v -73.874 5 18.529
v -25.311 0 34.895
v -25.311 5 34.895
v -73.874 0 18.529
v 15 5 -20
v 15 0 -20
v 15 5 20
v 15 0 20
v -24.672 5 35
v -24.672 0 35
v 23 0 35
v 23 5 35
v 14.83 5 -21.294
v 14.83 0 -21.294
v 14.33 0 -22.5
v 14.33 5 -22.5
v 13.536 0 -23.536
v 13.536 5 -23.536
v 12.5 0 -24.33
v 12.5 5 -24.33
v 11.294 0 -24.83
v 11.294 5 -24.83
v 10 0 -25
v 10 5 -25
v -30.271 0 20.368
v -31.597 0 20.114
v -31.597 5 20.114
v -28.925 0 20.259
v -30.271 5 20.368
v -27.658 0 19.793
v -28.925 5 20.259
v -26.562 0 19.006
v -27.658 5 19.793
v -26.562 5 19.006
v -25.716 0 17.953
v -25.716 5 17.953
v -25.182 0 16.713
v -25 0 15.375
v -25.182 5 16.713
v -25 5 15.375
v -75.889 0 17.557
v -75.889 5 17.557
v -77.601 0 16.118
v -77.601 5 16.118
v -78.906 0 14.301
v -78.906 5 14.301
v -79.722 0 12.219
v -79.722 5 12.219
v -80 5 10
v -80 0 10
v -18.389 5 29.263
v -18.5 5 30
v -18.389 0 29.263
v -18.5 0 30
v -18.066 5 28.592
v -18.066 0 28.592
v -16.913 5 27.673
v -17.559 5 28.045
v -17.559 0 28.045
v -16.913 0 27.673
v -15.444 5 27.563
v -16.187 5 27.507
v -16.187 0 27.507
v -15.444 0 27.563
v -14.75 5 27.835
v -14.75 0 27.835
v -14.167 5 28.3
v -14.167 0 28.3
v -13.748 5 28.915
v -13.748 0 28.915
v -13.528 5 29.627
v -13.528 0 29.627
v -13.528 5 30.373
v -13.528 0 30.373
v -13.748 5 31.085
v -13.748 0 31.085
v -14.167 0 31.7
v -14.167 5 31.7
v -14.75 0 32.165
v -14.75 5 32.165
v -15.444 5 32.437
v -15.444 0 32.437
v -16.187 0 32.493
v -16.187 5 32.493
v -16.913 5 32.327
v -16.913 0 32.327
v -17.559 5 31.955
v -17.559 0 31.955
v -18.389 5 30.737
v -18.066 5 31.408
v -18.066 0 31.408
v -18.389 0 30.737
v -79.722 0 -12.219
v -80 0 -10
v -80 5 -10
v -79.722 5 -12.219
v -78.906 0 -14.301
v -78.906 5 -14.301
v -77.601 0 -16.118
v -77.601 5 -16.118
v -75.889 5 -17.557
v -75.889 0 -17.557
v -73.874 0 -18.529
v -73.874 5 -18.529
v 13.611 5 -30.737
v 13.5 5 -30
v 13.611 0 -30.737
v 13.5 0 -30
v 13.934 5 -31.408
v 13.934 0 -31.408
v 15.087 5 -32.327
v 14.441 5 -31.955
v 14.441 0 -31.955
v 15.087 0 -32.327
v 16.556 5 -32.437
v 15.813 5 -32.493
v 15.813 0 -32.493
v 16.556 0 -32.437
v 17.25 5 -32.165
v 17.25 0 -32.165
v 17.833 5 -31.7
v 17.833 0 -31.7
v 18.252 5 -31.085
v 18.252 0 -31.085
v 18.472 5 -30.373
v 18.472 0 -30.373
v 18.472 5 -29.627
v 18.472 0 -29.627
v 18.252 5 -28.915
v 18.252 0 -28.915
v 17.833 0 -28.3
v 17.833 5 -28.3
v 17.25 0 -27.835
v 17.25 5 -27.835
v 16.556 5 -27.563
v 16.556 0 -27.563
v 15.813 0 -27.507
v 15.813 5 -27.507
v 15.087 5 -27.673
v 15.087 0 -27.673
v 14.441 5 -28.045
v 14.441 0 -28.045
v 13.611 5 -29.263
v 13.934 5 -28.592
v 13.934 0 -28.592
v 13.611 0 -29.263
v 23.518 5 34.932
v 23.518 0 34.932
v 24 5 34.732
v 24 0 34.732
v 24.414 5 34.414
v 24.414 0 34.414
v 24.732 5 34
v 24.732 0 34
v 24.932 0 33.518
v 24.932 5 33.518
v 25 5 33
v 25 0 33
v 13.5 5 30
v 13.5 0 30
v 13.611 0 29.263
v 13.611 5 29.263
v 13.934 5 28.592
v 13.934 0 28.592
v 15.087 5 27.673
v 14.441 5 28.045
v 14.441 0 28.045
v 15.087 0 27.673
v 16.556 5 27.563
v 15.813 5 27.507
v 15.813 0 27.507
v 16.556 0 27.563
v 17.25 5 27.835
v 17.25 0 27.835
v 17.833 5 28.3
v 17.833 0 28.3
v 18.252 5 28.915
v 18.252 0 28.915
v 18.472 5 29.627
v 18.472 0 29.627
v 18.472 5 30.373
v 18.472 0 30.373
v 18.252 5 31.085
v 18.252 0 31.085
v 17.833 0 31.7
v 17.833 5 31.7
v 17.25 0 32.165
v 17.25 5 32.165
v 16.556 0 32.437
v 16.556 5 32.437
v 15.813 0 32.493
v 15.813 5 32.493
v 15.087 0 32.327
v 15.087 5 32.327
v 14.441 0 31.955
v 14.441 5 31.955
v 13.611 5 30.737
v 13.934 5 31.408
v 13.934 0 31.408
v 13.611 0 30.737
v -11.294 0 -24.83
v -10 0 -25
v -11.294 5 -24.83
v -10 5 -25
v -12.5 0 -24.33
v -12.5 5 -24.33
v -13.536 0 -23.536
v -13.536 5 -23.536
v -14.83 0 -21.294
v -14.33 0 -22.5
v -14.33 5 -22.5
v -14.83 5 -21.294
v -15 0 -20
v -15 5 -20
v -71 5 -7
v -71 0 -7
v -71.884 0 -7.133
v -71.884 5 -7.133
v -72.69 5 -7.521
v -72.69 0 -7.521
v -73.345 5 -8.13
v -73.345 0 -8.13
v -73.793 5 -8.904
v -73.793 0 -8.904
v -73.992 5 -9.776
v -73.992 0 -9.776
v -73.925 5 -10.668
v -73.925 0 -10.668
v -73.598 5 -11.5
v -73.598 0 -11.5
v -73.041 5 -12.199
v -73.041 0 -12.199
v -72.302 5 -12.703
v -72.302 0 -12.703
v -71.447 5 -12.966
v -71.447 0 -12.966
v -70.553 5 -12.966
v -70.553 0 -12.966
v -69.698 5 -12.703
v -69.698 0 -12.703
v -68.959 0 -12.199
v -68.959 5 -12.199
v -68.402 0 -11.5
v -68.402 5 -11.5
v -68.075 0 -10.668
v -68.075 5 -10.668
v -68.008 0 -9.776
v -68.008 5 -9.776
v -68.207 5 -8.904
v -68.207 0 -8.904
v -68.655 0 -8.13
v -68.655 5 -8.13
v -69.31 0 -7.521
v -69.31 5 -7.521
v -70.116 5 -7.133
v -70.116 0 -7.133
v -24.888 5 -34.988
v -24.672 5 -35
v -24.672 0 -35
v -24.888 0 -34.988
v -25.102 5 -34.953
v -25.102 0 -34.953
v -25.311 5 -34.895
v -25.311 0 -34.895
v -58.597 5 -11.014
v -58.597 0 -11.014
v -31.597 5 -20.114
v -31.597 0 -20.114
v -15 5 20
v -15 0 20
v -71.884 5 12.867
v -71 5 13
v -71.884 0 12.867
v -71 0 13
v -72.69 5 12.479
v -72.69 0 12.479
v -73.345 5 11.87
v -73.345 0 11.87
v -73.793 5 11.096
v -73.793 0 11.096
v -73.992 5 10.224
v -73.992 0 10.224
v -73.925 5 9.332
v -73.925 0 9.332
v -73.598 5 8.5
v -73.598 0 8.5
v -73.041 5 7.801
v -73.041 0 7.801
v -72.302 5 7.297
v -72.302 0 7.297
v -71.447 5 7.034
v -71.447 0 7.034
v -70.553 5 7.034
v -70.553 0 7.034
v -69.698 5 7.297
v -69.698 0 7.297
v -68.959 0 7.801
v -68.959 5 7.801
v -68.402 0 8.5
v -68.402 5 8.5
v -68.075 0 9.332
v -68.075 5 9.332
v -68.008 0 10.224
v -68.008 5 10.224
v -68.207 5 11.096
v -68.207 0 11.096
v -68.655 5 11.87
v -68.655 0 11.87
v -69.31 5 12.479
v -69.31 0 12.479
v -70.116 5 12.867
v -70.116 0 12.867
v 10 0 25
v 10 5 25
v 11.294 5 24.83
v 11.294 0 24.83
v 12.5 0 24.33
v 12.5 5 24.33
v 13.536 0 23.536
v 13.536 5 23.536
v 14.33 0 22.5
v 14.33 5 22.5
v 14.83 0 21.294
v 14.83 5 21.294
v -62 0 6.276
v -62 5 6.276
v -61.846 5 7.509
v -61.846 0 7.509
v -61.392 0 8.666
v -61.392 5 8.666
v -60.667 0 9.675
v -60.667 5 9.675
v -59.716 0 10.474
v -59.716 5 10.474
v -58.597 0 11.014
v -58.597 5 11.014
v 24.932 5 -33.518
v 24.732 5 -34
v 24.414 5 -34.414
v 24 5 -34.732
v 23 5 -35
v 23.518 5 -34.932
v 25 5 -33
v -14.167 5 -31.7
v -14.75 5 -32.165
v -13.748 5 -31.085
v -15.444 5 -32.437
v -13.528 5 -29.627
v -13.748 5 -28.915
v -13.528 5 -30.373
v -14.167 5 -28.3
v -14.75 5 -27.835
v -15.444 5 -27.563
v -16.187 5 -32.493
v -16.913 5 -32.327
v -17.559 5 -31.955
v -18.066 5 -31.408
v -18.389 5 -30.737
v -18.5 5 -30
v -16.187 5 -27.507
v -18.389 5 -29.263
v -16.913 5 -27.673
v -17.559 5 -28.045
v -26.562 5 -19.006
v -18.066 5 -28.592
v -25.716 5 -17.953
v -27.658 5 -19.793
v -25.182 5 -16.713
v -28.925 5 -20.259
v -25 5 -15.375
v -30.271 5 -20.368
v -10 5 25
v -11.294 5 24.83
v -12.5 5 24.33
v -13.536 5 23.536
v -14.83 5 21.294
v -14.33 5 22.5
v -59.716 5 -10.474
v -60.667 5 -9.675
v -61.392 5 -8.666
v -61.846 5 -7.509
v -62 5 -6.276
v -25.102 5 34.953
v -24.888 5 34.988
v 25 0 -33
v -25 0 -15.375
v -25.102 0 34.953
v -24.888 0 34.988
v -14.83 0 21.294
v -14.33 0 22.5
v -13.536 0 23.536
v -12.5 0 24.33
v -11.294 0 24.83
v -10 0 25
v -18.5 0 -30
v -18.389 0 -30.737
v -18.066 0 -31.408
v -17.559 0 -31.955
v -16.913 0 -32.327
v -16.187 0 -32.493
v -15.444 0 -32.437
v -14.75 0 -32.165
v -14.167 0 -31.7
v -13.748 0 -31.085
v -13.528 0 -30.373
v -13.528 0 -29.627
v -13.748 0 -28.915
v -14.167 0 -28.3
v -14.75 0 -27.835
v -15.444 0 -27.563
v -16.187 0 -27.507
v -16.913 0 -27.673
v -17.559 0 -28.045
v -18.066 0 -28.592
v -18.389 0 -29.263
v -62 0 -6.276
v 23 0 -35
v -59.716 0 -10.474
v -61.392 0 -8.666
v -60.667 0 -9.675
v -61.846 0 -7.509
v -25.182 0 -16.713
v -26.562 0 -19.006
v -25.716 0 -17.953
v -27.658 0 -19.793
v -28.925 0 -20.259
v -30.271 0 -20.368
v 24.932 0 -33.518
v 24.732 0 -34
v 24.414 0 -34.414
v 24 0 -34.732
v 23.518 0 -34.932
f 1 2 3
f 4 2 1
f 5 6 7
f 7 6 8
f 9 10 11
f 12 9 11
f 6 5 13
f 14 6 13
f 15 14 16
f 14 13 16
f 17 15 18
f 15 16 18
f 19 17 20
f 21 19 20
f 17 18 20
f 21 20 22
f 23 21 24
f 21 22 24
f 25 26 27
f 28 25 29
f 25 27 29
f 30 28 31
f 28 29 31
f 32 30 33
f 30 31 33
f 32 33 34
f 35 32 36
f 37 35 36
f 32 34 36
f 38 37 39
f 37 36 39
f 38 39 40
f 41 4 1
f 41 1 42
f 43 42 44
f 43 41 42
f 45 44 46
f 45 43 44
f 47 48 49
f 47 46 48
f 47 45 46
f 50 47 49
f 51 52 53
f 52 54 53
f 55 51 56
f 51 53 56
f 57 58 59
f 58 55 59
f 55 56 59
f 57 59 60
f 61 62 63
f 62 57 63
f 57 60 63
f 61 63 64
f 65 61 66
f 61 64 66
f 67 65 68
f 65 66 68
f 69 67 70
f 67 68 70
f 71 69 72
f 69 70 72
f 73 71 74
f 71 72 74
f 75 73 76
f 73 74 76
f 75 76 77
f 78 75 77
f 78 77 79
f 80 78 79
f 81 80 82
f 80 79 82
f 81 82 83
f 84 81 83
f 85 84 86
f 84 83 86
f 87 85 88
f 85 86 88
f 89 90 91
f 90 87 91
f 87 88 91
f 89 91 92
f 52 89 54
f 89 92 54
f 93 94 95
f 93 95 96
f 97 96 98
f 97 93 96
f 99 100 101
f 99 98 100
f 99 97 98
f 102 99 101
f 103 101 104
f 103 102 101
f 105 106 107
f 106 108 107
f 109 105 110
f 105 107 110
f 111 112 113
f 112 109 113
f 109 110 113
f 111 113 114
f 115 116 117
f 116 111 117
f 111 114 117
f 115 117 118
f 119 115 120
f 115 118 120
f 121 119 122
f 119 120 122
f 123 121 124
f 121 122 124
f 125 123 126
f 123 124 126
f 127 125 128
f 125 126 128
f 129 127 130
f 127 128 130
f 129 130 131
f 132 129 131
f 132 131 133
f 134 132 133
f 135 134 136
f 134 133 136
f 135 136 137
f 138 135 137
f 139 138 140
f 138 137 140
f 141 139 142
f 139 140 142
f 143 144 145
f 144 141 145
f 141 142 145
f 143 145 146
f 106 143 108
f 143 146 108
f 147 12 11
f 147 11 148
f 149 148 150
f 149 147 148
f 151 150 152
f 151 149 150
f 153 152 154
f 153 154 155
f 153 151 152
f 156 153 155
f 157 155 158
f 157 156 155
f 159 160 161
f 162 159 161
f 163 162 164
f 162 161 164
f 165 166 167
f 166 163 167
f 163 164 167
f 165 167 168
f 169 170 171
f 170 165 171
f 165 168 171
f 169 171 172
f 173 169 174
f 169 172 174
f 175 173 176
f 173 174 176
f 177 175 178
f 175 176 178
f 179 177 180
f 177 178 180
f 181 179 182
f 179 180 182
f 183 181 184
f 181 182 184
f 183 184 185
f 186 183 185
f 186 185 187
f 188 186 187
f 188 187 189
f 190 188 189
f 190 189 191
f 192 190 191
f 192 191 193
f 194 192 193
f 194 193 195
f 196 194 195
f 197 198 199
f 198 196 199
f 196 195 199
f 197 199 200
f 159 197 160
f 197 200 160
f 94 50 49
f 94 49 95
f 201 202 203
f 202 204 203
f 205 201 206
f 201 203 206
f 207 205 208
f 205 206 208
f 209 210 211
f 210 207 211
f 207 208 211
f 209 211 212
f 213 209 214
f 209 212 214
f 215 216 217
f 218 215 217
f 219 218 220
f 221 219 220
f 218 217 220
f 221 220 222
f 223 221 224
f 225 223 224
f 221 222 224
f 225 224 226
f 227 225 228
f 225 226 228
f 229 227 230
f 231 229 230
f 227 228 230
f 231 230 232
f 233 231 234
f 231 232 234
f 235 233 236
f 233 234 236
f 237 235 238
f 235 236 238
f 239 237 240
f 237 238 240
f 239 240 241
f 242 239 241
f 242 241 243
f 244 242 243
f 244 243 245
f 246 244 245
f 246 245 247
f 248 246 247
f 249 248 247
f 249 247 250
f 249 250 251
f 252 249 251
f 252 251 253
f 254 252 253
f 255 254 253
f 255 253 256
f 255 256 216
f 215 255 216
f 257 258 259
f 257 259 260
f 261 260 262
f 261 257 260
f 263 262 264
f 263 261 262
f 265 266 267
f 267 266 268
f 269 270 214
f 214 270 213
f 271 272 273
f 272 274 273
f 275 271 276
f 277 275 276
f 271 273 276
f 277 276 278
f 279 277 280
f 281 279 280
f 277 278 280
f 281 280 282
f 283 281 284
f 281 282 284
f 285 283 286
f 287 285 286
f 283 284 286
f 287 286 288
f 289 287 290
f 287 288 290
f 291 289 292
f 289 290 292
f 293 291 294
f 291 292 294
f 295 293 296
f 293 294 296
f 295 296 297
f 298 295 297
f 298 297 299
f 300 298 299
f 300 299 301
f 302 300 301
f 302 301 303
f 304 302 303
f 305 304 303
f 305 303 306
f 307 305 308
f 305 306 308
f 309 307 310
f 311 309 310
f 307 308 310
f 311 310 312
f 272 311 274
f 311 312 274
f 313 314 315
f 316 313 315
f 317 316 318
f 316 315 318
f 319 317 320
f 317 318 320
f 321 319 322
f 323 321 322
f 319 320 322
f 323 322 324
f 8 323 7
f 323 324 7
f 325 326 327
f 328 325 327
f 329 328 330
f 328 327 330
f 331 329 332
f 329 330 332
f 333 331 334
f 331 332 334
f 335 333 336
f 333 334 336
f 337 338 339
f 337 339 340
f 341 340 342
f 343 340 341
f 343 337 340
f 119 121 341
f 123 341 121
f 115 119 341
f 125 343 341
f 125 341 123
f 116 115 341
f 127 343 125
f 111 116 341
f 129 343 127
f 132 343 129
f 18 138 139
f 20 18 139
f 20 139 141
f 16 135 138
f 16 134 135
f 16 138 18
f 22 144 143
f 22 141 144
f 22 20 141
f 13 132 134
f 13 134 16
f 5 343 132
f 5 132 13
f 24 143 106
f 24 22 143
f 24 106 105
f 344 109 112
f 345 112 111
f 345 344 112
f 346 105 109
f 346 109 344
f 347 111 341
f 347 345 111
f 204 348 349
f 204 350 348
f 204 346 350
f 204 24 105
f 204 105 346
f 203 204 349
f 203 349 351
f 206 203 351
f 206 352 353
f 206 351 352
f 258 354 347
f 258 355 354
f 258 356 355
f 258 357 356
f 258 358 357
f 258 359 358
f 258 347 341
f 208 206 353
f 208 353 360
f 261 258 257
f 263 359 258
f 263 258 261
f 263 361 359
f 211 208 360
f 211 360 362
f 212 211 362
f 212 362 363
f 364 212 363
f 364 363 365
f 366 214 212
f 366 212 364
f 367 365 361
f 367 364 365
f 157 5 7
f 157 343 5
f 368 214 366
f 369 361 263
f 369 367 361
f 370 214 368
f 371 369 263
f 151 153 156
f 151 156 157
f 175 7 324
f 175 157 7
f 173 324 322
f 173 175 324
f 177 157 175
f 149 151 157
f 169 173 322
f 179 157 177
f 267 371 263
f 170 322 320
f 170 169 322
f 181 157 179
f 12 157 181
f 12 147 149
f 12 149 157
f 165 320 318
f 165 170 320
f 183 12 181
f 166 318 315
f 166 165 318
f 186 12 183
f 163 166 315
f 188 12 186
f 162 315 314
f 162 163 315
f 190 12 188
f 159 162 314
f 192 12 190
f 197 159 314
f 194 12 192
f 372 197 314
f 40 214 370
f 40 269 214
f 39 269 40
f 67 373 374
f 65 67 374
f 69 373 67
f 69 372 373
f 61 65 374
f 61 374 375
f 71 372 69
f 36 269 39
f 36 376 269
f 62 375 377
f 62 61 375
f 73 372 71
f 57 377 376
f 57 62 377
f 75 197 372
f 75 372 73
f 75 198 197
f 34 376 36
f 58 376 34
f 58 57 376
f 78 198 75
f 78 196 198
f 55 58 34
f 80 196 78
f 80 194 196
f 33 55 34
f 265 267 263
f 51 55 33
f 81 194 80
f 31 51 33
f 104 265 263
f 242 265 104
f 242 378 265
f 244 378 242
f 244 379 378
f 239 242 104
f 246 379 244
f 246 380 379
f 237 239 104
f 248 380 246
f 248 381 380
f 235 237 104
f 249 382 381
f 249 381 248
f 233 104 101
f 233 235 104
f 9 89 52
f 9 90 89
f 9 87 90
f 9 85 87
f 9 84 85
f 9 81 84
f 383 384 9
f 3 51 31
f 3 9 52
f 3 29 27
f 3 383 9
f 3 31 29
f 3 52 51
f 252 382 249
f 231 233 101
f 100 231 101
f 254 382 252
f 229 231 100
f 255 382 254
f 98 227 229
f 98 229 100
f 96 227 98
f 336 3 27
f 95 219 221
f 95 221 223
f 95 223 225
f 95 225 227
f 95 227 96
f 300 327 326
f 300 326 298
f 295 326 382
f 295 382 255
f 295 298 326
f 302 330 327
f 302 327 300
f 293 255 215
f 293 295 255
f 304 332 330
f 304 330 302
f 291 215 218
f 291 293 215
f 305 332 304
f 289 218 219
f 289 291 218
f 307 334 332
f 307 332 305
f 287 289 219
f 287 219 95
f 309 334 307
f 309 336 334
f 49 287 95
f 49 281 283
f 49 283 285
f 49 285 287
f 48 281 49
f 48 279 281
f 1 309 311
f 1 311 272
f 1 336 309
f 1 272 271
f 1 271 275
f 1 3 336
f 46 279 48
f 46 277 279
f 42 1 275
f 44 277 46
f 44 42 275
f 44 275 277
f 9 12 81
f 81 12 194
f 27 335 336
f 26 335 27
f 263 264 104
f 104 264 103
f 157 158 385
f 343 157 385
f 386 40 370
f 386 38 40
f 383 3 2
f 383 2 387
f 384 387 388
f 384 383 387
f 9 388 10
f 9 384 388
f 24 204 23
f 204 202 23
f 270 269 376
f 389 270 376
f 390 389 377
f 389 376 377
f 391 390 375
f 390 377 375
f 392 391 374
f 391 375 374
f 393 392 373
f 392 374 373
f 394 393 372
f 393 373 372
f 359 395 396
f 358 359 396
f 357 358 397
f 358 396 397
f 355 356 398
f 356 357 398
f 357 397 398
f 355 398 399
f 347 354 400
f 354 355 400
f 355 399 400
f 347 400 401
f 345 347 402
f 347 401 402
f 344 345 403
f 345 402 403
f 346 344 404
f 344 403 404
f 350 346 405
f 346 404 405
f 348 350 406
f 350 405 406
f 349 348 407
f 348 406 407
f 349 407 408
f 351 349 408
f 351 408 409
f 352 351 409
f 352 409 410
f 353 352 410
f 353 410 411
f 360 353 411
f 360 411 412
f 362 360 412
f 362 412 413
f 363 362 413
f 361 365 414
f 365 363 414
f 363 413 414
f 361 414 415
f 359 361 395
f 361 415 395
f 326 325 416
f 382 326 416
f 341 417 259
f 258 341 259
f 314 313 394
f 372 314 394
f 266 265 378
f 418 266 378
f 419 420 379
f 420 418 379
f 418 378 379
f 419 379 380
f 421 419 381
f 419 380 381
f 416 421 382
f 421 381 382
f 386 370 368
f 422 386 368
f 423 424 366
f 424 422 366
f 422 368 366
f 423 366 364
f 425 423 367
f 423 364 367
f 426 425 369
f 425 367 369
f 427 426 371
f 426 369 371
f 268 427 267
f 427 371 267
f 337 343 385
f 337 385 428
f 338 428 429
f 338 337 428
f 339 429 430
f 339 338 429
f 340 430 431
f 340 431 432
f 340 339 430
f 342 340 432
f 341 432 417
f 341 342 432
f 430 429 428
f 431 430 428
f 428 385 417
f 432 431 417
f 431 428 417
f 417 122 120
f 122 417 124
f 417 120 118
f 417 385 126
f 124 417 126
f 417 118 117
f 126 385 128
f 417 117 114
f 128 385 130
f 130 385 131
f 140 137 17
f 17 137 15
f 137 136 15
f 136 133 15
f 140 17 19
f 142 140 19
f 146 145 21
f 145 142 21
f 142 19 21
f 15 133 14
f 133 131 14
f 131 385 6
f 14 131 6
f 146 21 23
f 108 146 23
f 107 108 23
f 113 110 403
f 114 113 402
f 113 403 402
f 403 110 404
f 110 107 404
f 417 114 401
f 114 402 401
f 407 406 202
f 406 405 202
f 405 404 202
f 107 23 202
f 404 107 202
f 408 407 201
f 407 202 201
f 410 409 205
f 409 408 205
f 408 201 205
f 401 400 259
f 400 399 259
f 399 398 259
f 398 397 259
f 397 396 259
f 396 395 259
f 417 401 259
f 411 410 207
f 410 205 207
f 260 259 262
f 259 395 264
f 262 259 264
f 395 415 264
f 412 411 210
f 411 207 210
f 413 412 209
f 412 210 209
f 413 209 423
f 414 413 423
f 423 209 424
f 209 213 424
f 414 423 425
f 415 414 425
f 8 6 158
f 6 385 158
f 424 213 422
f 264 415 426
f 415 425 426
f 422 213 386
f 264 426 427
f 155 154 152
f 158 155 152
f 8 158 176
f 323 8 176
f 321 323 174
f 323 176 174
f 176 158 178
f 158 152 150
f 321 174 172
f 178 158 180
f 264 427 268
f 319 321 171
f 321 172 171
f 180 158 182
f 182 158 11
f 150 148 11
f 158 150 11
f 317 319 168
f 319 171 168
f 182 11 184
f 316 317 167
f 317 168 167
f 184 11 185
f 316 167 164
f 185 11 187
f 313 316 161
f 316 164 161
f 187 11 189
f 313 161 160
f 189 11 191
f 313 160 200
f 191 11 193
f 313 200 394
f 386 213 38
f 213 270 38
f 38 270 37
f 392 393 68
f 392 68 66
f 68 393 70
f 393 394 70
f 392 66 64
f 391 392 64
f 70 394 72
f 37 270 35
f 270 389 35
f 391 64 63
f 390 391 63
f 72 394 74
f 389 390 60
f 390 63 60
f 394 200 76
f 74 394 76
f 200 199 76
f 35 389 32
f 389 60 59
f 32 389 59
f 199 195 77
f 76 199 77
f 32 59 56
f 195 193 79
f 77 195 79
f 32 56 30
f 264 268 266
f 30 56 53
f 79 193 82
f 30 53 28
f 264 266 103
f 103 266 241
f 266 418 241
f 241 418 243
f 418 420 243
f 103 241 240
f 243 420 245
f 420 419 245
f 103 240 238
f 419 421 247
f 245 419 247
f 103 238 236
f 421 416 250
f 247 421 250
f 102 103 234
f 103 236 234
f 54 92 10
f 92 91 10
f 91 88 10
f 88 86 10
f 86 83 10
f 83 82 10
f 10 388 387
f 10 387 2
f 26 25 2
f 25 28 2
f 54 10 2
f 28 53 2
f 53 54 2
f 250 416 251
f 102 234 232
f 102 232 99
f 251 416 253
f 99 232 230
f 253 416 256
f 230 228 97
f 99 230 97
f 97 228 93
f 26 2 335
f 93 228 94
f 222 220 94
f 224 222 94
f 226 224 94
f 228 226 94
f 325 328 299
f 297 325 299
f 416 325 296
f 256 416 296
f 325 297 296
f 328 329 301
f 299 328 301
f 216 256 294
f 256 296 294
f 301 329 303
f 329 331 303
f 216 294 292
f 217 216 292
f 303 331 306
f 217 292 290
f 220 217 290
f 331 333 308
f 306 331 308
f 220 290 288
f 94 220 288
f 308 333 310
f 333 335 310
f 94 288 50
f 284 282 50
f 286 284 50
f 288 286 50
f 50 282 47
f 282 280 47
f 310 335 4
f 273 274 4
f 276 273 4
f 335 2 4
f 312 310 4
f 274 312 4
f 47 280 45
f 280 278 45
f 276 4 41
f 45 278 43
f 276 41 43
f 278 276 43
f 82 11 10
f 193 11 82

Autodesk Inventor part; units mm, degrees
ref_plane "YZ Plane" through (0, 0, 0) normal (1, 0, 0) x (0, 1, 0)
ref_plane "XZ Plane" through (0, 0, 0) normal (0, 1, 0) x (-1, 0, 0)
ref_plane "XY Plane" through (0, 0, 0) normal (0, 0, 1) x (1, 0, 0)
sketch "Sketch1" plane through (0, 0, 0) normal (0, 1, 0) x (-1, 0, 0)
  circle A0 centre (0, 262.5) radius 3 construction
  circle A1 centre (0, -262.5) radius 3 construction
  line L0 (-25, -300) -> (25, -300) construction
  line L1 (25, -300) -> (25, 300) construction
  line L2 (-25, 300) -> (25, 300) construction
  line L3 (-25, -300) -> (-25, 300) construction
  circle A2 centre (71, 10) radius 3 projected
  circle A3 centre (71, -10) radius 3 projected
  arc A4 (5.8119, -39.1259) -> (-27.7565, -64.4201) centre (-3.9972, -61.0298) ccw construction
  arc A5 (-27.7597, 64.3976) -> (5.8116, 39.1072) centre (-4, 61.01) ccw construction
  line L4 (71, 10) -> (71, -10) construction
  circle A6 centre (71, -10) radius 9 construction
  circle A7 centre (71, 10) radius 9 construction
  line L5 (80, 10) -> (80, -10)
  line L6 (25, 35) -> (73.8743, 18.5287)
  line L7 (25, 35) -> (-25, 35)
  line L8 (-25, 35) -> (-25, -35)
  line L9 (-25, -35) -> (25, -35)
  line L10 (25, -35) -> (25, 35) construction
  line L11 (25, 35) -> (-25, -35) construction
  line L12 (-25, 35) -> (25, -35) construction
  line L13 (25, -35) -> (73.8743, -18.5287)
  arc A8 (80, 10) -> (73.8743, 18.5287) centre (71, 10) ccw
  arc A9 (73.8743, -18.5287) -> (80, -10) centre (71, -10) ccw
  line L14 (25, 35) -> (25, -35)
  line L15 (15, -25) -> (-15, -25)
  line L16 (-15, -25) -> (-15, 25)
  line L17 (-15, 25) -> (15, 25)
  line L18 (15, 25) -> (15, -25)
  line L19 (25, 35) -> (73.8743, 18.5287)
  line L20 (73.8743, 18.5287) -> (70.0419, 7.1571)
  line L21 (70.0419, 7.1571) -> (21.1676, 23.6284)
  line L22 (21.1676, 23.6284) -> (25, 35)
  line L23 (25, -35) -> (73.8743, -18.5287)
  line L24 (73.8743, -18.5287) -> (70.0419, -7.1571)
  line L25 (70.0419, -7.1571) -> (21.1676, -23.6284)
  line L26 (21.1676, -23.6284) -> (25, -35)
  line L27 (62, 10) -> (62, -10)
  line L28 (-25, 35) -> (-16, 35) construction
  line L29 (-16, 35) -> (-16, -35) construction
  line L30 (-16, -35) -> (-25, -35) construction
  line L31 (-25, -35) -> (-25, 35) construction
  line L32 (25, 35) -> (16, 35) construction
  line L33 (16, 35) -> (16, -35) construction
  line L34 (16, -35) -> (25, -35) construction
  line L35 (25, -35) -> (25, 35) construction
  line L36 (-25, 35) -> (25, 35) construction
  line L37 (25, 35) -> (25, 30) construction
  line L38 (25, 30) -> (-25, 30) construction
  line L39 (-25, 30) -> (-25, 35) construction
  line L40 (-25, -35) -> (25, -35) construction
  line L41 (25, -35) -> (25, -30) construction
  line L42 (25, -30) -> (-25, -30) construction
  line L43 (-25, -30) -> (-25, -35) construction
  circle A10 centre (16, 30) radius 2.5
  circle A11 centre (16, -30) radius 2.5
  circle A12 centre (-16, -30) radius 2.5
  circle A13 centre (-16, 30) radius 2.5
  point P0 (0, 0)
  point P1 (62, -9.8673)
  point P2 (25, -22.3369)
  point P3 (25, 22.3369)
  point P4 (62, 9.8673)
  dimension "d0" = 18
  dimension "d1" = 18
  dimension "d2" = 70
  dimension "d3" = 10
  dimension "d4" = 12
  dimension "d5" = 12
  dimension "d6" = 9
  dimension "d7" = 9
  dimension "d8" = 5
  dimension "d9" = 5
  dimension "d10" = 5
  dimension "d11" = 5
  dimension "d12" = 5
  dimension "d13" = 5
extrude "Extrusion1" add sketch "Sketch1" along normal blind 5 contours L20 A2 | L21 L14 L6 L20 A2 | A2 L20 | A2 L20 A8 L5 A9 L24 A3 L25 L27 L21 | L21 L22 L14 | L14 L25 L26 L9 L8 L7 L22 L21 | L25 A3 L24 L13 L14 | L14 L26 L25 | L24 A3 | A3 L24
fillet "Fillet1" radius 5 8 edges at (-15, 2.5, -25) (-15, 2.5, 25) (15, 2.5, 25) (15, 2.5, -25) (-25, 2.5, -22.3369) (-25, 2.5, 22.3369) (-62, 2.5, -9.8673) (-62, 2.5, 9.8673)
fillet "Fillet2" radius 2 4 edges at (25, 2.5, -35) (25, 2.5, 35) (-25, 2.5, -35) (-25, 2.5, 35)
sketch "Sketch3" plane through (0, 5, 0) normal (0, 1, 0) x (1, 0, 0)
  arc A0 (-80, -10) -> (-73.8743, -18.5287) centre (-71, -10) ccw projected
  arc A1 (-73.8743, 18.5287) -> (-80, 10) centre (-71, 10) ccw projected
  point P0 (0, 0)
hole "Hole1" at (-71, 5, 10) at (-71, 5, -10) direction (0, -1, 0) diameter 6 end through all
properties part number "pistonMount"
